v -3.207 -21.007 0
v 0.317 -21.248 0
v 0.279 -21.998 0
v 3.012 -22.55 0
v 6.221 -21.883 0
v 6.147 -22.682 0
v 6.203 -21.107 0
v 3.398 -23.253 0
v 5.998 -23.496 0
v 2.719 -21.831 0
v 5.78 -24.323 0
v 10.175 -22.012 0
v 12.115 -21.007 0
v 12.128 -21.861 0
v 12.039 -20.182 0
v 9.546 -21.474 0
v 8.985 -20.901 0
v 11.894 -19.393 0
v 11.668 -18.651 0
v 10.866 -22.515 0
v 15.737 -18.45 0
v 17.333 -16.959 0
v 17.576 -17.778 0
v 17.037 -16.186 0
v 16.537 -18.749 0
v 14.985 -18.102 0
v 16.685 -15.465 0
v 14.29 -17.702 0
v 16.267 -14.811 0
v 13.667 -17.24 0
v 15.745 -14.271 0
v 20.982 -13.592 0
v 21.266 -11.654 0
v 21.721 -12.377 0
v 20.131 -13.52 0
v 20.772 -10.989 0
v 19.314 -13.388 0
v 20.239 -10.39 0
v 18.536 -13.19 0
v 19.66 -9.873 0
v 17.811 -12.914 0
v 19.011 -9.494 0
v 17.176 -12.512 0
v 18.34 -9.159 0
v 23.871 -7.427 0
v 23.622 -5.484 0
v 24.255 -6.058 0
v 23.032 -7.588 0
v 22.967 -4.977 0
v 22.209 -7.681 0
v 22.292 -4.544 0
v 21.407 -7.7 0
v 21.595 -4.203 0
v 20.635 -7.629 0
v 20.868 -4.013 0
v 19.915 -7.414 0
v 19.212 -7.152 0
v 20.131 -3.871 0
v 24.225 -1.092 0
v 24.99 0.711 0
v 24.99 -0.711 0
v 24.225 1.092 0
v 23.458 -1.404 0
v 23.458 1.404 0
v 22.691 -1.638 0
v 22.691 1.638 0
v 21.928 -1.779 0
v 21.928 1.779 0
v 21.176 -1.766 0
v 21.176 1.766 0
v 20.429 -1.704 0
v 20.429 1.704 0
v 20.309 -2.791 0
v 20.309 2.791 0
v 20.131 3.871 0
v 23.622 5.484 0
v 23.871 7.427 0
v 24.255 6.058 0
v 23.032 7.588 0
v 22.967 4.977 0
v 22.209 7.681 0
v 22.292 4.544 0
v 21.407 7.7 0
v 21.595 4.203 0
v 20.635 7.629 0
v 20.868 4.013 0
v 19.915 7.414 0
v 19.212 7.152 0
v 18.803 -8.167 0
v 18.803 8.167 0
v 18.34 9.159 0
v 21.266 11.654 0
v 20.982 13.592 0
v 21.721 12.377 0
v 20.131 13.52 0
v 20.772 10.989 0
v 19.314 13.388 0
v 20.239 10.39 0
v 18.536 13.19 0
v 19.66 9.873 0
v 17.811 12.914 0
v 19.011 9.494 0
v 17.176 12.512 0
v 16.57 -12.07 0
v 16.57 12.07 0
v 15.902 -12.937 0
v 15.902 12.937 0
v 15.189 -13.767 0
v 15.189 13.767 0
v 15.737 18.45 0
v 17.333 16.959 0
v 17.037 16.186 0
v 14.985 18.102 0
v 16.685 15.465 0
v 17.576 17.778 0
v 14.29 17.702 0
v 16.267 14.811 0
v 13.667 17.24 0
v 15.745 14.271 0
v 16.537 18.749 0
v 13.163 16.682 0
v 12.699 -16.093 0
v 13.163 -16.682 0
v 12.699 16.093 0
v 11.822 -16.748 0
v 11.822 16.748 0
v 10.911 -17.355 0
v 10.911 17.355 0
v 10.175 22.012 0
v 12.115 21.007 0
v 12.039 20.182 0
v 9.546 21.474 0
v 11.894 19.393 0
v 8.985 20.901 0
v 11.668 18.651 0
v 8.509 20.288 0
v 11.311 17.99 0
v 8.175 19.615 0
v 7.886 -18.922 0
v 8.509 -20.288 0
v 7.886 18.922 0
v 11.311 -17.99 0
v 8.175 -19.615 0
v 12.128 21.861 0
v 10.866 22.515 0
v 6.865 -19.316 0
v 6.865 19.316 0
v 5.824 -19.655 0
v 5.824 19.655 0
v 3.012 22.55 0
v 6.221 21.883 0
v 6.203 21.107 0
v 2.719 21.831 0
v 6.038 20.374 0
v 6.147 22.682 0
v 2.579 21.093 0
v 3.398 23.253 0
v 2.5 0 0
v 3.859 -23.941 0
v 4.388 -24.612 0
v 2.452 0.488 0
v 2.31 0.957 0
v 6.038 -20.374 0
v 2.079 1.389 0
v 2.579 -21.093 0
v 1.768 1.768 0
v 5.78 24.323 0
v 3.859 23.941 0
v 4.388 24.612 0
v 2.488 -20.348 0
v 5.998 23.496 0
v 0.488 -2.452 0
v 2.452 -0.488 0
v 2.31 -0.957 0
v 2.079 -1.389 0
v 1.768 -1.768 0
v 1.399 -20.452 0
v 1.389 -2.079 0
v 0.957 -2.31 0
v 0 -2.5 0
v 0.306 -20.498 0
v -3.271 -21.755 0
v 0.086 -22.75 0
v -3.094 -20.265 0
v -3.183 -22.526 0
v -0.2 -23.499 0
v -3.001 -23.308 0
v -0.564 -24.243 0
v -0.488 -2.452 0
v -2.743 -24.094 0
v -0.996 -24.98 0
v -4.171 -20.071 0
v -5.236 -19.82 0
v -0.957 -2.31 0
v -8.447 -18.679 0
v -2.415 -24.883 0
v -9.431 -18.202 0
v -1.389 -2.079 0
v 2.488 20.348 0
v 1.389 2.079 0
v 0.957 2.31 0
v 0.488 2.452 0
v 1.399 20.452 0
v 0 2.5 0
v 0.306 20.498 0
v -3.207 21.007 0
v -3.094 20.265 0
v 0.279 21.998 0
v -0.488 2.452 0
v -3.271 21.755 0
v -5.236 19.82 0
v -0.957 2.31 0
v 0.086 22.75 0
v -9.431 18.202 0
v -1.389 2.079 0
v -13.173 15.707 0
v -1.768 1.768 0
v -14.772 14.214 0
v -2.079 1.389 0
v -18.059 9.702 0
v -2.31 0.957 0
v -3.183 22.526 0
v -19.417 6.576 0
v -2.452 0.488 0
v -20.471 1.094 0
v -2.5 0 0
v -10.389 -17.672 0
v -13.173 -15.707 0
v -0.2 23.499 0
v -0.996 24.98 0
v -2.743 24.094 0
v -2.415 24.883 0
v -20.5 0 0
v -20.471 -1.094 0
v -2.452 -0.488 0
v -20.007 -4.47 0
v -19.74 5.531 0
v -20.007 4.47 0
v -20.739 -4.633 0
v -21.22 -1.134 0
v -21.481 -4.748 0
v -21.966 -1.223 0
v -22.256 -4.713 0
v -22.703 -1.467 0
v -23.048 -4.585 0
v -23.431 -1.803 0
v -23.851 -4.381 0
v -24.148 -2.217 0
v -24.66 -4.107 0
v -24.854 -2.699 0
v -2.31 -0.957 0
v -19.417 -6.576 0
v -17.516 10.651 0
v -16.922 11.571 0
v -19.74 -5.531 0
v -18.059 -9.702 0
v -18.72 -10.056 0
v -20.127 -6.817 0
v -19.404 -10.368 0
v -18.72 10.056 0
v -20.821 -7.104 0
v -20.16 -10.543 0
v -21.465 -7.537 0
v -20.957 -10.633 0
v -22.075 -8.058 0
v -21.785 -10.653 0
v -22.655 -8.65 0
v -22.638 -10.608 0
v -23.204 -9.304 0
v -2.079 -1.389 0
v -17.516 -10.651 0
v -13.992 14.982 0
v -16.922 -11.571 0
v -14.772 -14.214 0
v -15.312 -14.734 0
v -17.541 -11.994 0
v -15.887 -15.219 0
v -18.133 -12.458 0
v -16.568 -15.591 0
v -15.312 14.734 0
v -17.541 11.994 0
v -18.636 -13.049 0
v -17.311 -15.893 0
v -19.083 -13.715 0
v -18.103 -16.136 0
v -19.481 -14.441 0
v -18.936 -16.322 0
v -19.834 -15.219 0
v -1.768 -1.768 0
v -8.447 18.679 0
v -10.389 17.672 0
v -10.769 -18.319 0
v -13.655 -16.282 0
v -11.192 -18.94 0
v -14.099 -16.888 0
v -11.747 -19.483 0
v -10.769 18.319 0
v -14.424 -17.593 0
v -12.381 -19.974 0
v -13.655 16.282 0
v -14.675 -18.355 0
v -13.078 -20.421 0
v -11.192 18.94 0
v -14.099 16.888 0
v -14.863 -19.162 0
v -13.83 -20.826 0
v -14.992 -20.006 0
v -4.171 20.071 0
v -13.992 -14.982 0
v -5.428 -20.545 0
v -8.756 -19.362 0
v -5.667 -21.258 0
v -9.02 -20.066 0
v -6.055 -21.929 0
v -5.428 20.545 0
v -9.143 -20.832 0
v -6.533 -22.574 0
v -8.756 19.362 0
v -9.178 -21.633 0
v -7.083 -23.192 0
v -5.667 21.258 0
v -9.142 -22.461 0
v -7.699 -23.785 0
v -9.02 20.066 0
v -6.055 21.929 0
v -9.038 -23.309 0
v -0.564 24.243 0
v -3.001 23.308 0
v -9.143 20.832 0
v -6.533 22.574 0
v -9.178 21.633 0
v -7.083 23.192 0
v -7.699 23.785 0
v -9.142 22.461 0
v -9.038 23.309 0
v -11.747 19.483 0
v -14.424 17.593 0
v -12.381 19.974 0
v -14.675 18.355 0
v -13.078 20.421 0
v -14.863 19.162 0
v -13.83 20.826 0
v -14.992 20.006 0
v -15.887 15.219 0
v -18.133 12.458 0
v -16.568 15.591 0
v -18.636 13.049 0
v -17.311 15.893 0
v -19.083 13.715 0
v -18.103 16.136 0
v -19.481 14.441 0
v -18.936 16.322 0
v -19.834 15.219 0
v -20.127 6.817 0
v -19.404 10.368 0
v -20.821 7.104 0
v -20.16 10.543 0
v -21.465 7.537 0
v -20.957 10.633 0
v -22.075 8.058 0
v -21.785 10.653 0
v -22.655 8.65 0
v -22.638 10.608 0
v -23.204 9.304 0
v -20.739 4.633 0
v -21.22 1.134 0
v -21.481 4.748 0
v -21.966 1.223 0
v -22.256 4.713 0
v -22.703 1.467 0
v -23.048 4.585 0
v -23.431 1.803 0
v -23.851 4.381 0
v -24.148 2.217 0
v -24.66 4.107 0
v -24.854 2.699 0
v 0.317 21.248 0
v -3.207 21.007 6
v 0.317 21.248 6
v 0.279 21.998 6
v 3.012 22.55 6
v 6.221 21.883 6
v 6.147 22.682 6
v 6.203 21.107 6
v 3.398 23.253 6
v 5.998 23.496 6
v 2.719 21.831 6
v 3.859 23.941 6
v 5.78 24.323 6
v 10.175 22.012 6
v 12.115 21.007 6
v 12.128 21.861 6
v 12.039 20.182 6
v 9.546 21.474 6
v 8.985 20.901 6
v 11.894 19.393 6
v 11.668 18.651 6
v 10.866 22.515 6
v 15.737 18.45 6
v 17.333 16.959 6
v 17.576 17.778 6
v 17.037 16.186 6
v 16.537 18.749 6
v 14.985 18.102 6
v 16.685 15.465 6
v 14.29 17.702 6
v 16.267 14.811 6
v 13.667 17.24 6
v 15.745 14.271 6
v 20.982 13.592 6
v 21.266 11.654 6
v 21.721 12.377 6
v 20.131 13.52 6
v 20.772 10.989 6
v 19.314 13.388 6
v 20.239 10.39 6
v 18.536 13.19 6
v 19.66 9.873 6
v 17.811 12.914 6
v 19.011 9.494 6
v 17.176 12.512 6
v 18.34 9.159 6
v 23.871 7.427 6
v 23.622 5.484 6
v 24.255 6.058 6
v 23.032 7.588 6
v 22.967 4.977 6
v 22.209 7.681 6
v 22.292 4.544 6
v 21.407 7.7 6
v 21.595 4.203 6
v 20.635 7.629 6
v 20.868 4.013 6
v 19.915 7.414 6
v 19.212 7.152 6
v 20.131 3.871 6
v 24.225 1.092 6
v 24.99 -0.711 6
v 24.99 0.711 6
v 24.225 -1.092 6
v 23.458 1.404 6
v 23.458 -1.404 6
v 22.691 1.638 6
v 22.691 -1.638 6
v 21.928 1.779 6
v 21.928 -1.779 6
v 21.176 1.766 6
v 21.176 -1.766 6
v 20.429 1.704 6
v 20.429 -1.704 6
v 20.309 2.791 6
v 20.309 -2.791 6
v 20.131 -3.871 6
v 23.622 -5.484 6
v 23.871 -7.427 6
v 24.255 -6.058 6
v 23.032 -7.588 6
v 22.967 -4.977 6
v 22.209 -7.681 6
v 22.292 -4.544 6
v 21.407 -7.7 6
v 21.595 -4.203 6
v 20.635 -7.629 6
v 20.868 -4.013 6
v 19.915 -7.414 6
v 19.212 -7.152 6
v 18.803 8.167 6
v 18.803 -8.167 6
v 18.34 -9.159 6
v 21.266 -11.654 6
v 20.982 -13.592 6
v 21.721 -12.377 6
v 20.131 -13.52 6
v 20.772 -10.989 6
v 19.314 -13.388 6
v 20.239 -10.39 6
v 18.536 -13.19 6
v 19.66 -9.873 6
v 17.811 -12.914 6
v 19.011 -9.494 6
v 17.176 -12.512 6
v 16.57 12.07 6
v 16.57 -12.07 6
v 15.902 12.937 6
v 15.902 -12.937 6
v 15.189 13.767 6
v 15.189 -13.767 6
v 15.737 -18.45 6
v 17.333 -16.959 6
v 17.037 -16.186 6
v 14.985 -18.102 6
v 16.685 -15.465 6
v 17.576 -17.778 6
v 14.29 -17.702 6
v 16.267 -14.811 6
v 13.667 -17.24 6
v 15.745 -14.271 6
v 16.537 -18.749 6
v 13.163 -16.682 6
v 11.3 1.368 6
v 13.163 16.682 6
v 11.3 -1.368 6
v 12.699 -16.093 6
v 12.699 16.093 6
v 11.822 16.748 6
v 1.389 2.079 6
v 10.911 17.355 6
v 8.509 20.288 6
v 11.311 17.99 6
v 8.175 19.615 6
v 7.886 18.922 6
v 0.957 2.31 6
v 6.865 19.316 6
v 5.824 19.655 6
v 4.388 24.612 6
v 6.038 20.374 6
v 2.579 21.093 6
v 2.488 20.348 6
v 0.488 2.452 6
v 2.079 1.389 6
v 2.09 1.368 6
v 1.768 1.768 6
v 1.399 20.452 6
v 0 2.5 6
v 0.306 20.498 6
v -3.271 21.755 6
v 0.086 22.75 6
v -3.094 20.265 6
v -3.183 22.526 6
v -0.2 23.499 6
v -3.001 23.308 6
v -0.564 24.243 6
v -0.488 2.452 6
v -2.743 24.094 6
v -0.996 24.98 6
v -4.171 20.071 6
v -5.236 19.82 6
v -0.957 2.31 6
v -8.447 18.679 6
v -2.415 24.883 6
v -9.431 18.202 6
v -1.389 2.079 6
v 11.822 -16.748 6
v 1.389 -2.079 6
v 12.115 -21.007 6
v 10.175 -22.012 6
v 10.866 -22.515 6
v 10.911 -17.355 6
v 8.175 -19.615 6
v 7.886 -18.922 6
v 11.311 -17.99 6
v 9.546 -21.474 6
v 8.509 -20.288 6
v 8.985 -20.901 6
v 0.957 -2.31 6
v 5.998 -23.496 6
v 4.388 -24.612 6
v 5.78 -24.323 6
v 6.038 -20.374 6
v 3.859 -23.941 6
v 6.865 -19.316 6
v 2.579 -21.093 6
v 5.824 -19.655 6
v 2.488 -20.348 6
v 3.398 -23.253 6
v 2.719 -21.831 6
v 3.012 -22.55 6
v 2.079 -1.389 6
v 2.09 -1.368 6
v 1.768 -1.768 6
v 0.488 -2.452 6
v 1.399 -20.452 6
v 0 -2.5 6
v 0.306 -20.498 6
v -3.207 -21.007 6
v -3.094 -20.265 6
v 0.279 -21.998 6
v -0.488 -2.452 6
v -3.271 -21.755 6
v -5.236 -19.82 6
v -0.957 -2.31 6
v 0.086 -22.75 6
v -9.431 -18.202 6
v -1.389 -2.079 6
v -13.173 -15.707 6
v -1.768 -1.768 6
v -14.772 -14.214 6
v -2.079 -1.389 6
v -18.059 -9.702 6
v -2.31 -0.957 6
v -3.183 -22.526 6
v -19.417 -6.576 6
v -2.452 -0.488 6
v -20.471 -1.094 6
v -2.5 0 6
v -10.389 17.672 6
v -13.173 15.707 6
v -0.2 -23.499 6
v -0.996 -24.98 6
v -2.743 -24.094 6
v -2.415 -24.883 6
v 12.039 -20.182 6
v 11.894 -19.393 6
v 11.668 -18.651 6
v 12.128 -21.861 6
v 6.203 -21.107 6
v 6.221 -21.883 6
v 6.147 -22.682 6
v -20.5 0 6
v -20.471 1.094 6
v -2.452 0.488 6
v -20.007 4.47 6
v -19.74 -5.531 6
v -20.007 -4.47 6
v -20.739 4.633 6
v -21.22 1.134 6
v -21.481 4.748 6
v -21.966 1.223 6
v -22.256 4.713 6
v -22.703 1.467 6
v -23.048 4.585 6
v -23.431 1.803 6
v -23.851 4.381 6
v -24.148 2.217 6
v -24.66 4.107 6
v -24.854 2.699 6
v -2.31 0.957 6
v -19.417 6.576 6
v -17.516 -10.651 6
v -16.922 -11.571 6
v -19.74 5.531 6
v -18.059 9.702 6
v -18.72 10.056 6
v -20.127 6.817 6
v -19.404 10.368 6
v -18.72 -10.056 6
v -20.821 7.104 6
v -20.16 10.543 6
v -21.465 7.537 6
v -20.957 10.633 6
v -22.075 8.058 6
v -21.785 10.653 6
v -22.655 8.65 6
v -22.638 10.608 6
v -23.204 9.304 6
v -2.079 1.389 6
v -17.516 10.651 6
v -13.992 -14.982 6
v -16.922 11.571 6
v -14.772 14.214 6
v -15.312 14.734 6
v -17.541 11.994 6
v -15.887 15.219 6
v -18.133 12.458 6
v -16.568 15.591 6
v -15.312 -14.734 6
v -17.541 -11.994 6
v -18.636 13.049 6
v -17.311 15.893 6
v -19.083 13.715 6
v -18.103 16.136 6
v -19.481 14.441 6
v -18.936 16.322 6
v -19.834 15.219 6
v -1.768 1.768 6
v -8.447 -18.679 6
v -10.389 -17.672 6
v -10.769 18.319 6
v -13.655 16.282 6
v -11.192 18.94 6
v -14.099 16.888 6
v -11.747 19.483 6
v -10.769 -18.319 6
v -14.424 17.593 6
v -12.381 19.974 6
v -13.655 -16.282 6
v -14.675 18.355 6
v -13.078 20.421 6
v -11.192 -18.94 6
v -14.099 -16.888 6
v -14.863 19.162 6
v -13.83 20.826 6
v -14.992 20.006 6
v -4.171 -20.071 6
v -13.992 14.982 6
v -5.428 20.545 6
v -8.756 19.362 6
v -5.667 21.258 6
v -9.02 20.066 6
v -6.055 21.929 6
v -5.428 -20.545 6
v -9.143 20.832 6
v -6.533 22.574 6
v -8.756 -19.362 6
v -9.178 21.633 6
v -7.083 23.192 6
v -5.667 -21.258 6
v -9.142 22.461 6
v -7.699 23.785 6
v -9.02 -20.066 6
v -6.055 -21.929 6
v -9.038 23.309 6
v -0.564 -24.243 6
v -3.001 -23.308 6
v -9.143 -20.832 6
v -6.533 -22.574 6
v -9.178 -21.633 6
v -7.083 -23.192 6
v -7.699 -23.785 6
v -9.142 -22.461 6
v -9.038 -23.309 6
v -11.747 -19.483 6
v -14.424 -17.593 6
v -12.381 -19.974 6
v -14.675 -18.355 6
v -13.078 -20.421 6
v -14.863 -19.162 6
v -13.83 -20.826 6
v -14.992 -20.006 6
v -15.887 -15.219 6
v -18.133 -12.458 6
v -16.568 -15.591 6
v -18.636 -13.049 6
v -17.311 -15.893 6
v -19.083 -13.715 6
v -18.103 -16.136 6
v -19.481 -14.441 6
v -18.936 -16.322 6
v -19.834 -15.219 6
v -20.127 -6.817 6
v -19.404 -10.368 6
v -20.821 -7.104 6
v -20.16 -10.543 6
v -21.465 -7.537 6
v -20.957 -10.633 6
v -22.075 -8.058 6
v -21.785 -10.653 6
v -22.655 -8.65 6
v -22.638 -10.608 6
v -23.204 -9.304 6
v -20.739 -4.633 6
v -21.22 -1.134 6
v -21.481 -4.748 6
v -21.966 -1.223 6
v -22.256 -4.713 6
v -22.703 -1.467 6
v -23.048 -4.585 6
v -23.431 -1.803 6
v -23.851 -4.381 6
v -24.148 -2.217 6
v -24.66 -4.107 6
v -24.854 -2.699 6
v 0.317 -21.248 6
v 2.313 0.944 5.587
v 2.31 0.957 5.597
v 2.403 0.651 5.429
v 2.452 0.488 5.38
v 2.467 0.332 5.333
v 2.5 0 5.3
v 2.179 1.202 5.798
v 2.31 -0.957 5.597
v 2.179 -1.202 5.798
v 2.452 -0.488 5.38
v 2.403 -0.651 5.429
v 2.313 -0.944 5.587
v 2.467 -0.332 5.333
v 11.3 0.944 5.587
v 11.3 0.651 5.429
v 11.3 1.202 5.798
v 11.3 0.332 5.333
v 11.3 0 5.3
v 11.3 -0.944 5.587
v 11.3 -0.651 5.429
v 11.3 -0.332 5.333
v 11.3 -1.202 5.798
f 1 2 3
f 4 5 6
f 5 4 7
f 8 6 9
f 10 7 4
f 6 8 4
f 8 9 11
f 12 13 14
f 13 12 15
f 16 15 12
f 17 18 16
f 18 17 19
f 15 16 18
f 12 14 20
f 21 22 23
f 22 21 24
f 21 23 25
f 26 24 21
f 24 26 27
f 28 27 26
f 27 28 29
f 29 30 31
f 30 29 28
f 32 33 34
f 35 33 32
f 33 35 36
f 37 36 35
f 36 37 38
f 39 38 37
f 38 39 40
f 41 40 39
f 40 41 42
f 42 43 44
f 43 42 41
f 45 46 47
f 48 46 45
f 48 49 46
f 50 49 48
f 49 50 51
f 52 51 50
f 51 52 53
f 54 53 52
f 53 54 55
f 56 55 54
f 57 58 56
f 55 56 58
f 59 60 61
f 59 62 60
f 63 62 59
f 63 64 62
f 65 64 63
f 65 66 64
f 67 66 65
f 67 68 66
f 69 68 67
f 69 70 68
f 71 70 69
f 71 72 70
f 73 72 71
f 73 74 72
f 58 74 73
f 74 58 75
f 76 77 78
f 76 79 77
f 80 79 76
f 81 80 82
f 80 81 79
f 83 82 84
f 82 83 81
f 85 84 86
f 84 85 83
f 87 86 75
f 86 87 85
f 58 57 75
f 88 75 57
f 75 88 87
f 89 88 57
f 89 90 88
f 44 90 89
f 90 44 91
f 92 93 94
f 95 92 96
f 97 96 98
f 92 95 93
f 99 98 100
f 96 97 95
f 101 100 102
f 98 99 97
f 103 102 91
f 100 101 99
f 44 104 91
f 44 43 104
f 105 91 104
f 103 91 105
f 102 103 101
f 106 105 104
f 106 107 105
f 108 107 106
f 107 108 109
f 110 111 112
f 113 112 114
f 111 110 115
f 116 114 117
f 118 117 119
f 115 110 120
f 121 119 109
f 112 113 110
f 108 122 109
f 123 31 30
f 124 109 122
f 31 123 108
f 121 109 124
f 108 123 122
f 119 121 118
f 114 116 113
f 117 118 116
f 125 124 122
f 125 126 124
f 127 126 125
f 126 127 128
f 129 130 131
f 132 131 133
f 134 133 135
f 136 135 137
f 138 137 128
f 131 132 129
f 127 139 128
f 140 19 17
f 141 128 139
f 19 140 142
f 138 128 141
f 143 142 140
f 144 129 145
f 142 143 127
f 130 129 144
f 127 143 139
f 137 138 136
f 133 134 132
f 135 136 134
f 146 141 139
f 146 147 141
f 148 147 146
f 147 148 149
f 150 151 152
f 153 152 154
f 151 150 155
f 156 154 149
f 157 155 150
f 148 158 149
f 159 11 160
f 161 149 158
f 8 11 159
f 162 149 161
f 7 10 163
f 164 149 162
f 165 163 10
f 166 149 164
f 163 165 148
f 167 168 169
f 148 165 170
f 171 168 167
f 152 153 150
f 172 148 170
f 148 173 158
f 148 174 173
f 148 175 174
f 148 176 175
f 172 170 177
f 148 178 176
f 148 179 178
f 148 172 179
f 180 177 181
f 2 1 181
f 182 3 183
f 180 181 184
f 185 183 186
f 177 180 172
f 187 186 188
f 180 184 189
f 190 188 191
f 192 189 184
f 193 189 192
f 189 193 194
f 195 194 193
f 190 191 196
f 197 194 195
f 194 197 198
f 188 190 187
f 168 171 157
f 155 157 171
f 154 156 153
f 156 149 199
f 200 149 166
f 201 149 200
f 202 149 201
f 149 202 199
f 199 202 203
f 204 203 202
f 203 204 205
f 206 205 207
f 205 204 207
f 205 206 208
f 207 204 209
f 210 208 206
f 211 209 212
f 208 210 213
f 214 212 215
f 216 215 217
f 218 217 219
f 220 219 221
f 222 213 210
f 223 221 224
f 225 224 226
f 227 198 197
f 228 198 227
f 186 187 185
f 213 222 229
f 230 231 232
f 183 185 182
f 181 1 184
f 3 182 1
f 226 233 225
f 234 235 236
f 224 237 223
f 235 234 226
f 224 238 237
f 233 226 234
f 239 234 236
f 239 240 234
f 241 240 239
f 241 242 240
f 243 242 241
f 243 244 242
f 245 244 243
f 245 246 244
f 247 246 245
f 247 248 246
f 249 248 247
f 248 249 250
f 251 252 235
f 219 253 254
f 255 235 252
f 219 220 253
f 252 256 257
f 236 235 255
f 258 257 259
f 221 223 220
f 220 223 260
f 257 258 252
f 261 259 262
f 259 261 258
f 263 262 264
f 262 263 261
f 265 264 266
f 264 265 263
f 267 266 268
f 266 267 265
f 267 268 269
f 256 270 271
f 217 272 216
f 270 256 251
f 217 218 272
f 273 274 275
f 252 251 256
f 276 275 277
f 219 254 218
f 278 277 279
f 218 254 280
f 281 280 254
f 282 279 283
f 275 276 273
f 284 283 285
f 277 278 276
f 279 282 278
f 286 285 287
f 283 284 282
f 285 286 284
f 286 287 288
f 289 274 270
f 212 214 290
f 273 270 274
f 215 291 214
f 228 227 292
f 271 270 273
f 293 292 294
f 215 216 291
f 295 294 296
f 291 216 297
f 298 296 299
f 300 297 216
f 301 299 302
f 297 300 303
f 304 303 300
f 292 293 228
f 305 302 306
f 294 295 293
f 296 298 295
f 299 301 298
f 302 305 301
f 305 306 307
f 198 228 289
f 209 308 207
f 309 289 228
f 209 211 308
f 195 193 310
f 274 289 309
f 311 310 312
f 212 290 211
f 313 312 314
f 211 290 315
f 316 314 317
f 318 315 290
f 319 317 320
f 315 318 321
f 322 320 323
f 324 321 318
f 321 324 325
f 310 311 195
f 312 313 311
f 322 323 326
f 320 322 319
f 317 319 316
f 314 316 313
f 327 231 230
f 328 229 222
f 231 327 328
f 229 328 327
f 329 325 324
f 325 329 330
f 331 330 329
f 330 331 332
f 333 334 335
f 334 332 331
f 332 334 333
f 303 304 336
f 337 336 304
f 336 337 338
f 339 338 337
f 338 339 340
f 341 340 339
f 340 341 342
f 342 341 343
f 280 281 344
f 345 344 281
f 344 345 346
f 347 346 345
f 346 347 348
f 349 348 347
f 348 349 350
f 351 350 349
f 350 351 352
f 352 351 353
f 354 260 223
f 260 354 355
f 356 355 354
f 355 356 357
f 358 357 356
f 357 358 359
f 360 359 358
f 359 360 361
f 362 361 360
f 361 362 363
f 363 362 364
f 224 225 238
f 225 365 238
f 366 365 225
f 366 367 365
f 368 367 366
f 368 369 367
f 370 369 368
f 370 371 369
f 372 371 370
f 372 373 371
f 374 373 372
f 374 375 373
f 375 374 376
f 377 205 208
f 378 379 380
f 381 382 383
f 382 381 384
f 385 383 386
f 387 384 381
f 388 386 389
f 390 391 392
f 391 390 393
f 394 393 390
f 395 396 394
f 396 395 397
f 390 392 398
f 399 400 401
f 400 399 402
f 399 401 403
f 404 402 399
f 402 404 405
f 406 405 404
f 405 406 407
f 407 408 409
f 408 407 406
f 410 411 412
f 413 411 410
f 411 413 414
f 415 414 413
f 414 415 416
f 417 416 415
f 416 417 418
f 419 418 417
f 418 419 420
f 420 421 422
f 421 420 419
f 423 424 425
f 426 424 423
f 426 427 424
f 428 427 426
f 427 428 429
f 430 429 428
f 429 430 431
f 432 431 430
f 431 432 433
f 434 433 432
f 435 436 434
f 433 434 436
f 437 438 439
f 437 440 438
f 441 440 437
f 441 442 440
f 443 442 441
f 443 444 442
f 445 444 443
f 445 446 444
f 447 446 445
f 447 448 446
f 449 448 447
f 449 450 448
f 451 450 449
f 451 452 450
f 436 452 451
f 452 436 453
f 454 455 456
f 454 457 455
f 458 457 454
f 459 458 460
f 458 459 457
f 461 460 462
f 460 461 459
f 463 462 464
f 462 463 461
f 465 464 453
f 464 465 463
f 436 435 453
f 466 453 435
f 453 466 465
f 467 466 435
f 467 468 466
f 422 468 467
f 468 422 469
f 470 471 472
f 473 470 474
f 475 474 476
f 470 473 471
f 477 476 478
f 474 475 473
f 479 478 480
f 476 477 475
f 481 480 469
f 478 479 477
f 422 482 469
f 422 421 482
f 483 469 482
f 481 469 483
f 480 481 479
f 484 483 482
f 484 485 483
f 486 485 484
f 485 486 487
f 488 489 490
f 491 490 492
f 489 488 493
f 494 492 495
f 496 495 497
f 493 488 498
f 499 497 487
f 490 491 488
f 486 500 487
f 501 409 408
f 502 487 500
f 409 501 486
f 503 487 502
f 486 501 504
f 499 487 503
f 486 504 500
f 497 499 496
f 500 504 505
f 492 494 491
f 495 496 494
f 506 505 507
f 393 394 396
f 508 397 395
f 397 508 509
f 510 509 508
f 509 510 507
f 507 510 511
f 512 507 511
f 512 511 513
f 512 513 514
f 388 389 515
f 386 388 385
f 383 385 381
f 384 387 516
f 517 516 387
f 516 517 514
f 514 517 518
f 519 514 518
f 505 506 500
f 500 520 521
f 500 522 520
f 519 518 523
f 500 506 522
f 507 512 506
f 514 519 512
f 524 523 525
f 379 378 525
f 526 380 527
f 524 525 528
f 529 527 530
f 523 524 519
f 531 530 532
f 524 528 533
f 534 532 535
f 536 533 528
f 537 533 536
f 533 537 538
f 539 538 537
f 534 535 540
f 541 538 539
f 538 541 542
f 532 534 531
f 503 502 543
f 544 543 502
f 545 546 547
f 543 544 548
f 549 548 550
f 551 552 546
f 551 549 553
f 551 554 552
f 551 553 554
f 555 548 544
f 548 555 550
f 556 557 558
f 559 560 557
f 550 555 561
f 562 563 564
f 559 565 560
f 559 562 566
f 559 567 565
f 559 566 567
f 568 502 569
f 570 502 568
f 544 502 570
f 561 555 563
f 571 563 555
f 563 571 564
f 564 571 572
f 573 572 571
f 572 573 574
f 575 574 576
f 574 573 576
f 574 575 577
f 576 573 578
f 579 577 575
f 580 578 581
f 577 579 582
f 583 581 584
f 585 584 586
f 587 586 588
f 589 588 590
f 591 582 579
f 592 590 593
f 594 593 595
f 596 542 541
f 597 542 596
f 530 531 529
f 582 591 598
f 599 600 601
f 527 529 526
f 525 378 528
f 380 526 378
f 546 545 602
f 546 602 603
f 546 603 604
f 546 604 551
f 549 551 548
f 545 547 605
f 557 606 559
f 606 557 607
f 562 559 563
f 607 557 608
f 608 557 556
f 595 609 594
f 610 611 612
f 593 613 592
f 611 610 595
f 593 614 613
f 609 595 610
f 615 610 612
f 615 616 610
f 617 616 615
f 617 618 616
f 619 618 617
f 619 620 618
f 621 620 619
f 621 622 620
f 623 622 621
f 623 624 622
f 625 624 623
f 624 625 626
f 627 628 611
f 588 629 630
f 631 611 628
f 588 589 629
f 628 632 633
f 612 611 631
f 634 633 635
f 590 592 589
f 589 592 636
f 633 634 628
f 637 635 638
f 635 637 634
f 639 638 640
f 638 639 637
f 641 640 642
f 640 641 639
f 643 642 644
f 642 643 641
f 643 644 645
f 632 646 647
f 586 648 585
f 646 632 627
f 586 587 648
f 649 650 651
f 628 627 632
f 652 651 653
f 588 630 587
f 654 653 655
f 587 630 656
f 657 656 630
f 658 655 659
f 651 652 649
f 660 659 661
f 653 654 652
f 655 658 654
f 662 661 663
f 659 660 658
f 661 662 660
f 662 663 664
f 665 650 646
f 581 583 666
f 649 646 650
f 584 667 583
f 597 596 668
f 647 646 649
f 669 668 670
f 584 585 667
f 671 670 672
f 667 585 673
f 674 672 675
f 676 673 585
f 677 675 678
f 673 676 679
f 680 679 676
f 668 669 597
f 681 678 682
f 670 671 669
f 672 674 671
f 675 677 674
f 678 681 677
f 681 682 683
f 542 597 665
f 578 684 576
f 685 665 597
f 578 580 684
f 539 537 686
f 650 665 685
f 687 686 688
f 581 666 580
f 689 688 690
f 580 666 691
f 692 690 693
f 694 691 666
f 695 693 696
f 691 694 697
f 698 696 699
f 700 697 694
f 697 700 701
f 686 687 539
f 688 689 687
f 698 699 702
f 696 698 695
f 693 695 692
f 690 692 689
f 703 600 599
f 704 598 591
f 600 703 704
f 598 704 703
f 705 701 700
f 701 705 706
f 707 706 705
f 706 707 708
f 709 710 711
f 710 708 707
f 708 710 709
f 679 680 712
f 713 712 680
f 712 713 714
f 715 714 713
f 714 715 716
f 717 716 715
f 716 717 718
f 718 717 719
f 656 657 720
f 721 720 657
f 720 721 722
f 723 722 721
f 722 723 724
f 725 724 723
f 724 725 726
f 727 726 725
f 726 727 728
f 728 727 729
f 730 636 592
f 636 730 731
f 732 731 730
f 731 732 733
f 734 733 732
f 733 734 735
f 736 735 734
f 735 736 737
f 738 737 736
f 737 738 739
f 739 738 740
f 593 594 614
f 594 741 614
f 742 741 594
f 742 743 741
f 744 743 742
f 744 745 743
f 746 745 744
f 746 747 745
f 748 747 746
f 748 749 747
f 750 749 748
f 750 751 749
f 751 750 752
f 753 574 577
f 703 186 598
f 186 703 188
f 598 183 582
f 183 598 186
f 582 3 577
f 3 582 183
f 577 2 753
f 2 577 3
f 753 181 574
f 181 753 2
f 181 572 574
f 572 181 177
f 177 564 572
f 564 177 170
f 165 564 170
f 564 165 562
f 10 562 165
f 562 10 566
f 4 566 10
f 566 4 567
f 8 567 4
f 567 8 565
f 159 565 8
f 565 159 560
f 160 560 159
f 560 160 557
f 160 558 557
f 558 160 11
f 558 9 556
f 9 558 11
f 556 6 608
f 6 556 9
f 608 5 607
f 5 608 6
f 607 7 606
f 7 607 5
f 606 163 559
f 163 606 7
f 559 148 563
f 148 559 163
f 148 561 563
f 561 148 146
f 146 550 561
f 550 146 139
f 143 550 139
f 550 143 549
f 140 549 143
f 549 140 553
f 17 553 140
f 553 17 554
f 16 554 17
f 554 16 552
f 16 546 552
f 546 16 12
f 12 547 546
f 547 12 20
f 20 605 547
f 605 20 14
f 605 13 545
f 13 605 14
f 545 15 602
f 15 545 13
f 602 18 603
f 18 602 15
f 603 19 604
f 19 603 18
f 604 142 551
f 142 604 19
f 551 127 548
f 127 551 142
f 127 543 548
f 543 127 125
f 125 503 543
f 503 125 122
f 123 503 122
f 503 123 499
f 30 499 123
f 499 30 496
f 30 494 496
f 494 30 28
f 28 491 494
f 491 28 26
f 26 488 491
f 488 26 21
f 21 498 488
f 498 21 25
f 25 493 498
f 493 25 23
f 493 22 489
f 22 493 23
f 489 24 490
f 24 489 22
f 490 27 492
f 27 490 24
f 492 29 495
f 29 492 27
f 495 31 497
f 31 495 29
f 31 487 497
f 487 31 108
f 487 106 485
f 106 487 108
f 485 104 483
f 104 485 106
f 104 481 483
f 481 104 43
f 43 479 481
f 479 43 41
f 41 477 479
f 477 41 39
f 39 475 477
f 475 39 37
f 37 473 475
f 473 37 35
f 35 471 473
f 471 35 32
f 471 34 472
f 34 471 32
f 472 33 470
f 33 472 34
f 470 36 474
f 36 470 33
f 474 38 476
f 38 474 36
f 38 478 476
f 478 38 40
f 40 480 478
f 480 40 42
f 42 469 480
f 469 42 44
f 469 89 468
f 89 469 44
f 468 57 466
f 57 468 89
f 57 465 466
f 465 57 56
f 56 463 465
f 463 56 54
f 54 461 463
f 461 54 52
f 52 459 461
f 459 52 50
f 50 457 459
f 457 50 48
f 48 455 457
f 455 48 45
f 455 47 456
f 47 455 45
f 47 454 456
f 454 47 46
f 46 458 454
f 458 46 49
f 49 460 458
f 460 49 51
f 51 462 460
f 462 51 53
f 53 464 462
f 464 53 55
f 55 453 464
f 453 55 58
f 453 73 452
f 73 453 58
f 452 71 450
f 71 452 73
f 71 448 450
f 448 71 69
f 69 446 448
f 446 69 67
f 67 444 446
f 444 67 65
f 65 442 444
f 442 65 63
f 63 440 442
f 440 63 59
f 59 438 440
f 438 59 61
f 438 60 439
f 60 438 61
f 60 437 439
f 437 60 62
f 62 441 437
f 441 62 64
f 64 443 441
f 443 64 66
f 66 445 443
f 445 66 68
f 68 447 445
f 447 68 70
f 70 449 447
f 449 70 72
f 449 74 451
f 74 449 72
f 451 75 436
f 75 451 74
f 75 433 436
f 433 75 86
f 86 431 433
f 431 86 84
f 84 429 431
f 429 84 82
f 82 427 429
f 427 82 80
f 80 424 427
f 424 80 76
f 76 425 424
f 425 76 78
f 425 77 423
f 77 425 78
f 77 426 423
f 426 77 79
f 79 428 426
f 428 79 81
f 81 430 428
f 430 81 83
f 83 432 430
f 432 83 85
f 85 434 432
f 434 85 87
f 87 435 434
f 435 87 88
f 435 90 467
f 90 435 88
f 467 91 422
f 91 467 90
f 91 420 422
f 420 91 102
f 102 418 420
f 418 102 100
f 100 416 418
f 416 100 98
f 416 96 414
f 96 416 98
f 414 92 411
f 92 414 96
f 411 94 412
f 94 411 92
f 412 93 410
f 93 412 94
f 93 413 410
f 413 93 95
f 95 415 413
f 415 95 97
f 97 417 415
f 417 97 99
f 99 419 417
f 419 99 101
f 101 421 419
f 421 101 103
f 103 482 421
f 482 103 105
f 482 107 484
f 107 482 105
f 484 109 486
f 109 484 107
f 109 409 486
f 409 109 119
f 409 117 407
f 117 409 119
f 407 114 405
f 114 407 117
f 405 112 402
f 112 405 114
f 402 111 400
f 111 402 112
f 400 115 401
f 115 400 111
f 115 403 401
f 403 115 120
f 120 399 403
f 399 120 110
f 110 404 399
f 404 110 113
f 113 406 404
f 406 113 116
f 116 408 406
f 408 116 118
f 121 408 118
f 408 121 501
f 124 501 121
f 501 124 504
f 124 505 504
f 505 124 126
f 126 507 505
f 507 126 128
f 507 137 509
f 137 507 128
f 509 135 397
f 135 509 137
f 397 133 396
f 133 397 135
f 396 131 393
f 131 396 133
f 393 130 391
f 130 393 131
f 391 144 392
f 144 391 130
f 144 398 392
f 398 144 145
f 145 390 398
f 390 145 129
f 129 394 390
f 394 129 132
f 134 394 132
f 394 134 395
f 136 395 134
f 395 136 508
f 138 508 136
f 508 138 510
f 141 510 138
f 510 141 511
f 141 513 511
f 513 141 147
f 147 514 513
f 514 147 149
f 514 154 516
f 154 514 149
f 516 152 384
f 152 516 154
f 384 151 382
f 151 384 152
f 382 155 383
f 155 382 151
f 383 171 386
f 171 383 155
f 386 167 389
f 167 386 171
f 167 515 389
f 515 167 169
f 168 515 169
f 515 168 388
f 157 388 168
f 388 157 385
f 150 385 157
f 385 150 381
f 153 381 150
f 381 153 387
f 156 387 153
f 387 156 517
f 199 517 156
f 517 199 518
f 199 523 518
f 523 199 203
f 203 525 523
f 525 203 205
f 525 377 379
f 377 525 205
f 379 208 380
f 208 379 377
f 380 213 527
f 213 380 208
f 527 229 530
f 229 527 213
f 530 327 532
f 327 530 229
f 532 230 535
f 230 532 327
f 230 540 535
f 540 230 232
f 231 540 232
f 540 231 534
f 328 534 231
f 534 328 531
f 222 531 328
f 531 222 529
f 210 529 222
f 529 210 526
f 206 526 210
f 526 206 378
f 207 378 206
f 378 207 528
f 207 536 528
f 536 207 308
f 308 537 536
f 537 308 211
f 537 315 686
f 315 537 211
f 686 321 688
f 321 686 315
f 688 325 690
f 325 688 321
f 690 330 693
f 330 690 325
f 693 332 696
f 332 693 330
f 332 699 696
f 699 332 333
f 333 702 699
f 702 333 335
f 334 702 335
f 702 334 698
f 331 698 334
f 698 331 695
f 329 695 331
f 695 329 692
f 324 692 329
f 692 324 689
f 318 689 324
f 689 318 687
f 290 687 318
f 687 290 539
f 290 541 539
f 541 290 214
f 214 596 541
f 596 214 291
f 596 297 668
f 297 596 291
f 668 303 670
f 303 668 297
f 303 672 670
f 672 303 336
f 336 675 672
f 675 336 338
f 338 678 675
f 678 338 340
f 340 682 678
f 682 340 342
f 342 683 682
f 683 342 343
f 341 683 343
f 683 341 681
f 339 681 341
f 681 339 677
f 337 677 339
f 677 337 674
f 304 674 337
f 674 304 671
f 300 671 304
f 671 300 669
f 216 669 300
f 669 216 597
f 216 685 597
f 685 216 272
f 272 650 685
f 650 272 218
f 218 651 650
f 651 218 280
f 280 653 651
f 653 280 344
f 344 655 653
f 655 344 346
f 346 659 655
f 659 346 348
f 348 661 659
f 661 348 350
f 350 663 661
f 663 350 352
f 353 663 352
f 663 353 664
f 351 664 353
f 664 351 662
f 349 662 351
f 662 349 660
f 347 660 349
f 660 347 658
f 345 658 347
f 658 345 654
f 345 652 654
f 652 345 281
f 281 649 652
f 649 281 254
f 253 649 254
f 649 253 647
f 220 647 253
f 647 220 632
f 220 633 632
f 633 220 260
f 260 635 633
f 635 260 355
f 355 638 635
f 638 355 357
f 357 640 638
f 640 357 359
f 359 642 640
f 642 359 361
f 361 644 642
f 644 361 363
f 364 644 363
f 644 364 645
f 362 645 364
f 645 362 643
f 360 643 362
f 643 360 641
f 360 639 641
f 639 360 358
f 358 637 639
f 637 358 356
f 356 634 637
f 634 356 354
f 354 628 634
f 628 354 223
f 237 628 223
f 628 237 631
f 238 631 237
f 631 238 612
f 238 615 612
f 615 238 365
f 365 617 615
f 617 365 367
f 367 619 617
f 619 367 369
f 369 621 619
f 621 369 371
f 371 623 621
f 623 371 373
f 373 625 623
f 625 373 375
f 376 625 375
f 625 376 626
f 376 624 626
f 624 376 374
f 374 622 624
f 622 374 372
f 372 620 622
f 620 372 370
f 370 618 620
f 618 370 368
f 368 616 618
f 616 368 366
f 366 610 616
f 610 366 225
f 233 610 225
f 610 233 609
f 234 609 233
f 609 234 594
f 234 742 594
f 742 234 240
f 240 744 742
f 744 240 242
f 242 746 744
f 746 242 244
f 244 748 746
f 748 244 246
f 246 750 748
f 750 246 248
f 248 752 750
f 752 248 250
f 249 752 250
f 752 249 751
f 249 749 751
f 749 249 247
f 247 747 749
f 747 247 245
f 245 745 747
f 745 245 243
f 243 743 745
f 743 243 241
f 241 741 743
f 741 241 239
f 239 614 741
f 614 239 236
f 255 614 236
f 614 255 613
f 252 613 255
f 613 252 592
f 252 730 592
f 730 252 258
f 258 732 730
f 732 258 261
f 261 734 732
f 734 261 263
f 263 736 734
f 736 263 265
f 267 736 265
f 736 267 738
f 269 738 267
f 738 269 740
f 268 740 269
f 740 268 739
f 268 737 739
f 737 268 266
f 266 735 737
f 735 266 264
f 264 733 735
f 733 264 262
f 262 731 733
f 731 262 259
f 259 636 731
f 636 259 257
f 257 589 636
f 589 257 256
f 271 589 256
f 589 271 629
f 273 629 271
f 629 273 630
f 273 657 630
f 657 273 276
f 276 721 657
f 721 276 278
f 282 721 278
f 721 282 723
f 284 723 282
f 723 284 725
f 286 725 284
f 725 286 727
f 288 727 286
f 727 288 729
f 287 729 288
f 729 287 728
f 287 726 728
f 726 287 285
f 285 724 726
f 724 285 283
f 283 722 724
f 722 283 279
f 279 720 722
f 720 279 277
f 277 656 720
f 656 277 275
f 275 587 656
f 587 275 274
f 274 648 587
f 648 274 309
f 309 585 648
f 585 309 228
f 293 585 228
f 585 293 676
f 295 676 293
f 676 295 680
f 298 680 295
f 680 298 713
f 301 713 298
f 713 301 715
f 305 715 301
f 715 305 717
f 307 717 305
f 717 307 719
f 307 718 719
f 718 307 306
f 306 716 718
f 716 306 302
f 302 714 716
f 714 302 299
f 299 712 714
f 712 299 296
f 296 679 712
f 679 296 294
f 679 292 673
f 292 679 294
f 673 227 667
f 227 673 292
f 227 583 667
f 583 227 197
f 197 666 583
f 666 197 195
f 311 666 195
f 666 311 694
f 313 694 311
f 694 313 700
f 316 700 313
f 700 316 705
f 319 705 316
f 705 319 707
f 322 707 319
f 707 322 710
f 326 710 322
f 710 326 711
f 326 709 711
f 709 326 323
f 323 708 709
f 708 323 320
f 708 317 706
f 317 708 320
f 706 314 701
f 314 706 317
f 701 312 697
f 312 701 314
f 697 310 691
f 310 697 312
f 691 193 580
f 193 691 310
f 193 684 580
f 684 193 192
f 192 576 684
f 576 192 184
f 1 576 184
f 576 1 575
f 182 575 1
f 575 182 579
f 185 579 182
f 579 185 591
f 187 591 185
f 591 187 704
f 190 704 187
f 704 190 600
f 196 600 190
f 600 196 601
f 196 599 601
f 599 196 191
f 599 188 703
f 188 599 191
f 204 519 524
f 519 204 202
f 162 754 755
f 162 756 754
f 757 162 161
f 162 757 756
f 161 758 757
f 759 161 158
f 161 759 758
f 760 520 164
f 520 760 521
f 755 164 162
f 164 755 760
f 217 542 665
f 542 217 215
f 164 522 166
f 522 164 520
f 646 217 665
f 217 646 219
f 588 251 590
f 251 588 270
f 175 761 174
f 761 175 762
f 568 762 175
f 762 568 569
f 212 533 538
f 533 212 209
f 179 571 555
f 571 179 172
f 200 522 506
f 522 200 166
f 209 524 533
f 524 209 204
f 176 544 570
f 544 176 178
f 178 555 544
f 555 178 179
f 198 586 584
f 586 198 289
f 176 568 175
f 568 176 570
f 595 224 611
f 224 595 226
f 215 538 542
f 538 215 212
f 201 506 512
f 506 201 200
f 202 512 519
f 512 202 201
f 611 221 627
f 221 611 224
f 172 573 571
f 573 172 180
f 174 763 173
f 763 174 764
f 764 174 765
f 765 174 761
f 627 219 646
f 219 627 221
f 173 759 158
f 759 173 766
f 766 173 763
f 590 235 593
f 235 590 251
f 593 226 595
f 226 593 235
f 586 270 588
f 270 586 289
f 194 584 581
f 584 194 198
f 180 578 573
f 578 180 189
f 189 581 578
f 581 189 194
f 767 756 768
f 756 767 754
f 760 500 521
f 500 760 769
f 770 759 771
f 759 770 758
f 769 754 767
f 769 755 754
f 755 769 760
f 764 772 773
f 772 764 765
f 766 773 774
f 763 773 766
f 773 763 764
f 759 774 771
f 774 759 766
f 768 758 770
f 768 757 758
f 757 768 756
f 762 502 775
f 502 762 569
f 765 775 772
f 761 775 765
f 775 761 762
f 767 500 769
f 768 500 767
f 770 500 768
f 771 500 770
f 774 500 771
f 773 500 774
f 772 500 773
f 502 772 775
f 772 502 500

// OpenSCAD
$fn = 32;

// ----------------------------------------------------------------------
// Spur gear: m=2 z=23, 50 mm tip diameter x 6 mm
// ----------------------------------------------------------------------

// --- parameters (mm) ---
module_m = 2;             // module
teeth = 23;               // number of teeth
face_w = 6;               // face width
pa = 20;                  // pressure angle, deg
bore_d = 5;               // shaft bore
set_d = 3.4;              // set screw tap hole
set_z = 7;                // set screw height

/* --- involute profile --- */
pitch_r = module_m * teeth / 2;
base_r = pitch_r * cos(pa);
tip_r = pitch_r + module_m;
root_r = pitch_r - 1.25 * module_m;
flank_steps = 6;

function inv_deg(a) = (tan(a) - a * PI / 180) * 180 / PI;
function flank_r(i) = root_r + (tip_r - root_r) * i / flank_steps;
function half_angle(r) = 90 / teeth + inv_deg(pa) - inv_deg(acos(min(1, base_r / r)));
function tooth_pt(k, i, side) =
    let (r = flank_r(i), a = k * 360 / teeth + side * half_angle(r))
    [r * cos(a), r * sin(a)];

module tooth_profile() {
  polygon(points = [
    for (k = [0 : teeth - 1])
      each [
        for (i = [0 : flank_steps]) tooth_pt(k, i, -1),
        for (i = [flank_steps : -1 : 0]) tooth_pt(k, i, 1),
        let (ta = (k + 0.5) * 360 / teeth)
          [root_r * cos(ta), root_r * sin(ta)]
      ]
  ]);
}

module gear_disc() {
  linear_extrude(height = face_w) tooth_profile();
}

difference() {
  gear_disc();
  translate([0, 0, -1]) cylinder(h = face_w + 3, d = bore_d);
  /* set screw, drilled radially */
  translate([-1, 0, set_z]) rotate([0, 90, 0]) cylinder(h = (root_r * 0.6), d = set_d);
}
